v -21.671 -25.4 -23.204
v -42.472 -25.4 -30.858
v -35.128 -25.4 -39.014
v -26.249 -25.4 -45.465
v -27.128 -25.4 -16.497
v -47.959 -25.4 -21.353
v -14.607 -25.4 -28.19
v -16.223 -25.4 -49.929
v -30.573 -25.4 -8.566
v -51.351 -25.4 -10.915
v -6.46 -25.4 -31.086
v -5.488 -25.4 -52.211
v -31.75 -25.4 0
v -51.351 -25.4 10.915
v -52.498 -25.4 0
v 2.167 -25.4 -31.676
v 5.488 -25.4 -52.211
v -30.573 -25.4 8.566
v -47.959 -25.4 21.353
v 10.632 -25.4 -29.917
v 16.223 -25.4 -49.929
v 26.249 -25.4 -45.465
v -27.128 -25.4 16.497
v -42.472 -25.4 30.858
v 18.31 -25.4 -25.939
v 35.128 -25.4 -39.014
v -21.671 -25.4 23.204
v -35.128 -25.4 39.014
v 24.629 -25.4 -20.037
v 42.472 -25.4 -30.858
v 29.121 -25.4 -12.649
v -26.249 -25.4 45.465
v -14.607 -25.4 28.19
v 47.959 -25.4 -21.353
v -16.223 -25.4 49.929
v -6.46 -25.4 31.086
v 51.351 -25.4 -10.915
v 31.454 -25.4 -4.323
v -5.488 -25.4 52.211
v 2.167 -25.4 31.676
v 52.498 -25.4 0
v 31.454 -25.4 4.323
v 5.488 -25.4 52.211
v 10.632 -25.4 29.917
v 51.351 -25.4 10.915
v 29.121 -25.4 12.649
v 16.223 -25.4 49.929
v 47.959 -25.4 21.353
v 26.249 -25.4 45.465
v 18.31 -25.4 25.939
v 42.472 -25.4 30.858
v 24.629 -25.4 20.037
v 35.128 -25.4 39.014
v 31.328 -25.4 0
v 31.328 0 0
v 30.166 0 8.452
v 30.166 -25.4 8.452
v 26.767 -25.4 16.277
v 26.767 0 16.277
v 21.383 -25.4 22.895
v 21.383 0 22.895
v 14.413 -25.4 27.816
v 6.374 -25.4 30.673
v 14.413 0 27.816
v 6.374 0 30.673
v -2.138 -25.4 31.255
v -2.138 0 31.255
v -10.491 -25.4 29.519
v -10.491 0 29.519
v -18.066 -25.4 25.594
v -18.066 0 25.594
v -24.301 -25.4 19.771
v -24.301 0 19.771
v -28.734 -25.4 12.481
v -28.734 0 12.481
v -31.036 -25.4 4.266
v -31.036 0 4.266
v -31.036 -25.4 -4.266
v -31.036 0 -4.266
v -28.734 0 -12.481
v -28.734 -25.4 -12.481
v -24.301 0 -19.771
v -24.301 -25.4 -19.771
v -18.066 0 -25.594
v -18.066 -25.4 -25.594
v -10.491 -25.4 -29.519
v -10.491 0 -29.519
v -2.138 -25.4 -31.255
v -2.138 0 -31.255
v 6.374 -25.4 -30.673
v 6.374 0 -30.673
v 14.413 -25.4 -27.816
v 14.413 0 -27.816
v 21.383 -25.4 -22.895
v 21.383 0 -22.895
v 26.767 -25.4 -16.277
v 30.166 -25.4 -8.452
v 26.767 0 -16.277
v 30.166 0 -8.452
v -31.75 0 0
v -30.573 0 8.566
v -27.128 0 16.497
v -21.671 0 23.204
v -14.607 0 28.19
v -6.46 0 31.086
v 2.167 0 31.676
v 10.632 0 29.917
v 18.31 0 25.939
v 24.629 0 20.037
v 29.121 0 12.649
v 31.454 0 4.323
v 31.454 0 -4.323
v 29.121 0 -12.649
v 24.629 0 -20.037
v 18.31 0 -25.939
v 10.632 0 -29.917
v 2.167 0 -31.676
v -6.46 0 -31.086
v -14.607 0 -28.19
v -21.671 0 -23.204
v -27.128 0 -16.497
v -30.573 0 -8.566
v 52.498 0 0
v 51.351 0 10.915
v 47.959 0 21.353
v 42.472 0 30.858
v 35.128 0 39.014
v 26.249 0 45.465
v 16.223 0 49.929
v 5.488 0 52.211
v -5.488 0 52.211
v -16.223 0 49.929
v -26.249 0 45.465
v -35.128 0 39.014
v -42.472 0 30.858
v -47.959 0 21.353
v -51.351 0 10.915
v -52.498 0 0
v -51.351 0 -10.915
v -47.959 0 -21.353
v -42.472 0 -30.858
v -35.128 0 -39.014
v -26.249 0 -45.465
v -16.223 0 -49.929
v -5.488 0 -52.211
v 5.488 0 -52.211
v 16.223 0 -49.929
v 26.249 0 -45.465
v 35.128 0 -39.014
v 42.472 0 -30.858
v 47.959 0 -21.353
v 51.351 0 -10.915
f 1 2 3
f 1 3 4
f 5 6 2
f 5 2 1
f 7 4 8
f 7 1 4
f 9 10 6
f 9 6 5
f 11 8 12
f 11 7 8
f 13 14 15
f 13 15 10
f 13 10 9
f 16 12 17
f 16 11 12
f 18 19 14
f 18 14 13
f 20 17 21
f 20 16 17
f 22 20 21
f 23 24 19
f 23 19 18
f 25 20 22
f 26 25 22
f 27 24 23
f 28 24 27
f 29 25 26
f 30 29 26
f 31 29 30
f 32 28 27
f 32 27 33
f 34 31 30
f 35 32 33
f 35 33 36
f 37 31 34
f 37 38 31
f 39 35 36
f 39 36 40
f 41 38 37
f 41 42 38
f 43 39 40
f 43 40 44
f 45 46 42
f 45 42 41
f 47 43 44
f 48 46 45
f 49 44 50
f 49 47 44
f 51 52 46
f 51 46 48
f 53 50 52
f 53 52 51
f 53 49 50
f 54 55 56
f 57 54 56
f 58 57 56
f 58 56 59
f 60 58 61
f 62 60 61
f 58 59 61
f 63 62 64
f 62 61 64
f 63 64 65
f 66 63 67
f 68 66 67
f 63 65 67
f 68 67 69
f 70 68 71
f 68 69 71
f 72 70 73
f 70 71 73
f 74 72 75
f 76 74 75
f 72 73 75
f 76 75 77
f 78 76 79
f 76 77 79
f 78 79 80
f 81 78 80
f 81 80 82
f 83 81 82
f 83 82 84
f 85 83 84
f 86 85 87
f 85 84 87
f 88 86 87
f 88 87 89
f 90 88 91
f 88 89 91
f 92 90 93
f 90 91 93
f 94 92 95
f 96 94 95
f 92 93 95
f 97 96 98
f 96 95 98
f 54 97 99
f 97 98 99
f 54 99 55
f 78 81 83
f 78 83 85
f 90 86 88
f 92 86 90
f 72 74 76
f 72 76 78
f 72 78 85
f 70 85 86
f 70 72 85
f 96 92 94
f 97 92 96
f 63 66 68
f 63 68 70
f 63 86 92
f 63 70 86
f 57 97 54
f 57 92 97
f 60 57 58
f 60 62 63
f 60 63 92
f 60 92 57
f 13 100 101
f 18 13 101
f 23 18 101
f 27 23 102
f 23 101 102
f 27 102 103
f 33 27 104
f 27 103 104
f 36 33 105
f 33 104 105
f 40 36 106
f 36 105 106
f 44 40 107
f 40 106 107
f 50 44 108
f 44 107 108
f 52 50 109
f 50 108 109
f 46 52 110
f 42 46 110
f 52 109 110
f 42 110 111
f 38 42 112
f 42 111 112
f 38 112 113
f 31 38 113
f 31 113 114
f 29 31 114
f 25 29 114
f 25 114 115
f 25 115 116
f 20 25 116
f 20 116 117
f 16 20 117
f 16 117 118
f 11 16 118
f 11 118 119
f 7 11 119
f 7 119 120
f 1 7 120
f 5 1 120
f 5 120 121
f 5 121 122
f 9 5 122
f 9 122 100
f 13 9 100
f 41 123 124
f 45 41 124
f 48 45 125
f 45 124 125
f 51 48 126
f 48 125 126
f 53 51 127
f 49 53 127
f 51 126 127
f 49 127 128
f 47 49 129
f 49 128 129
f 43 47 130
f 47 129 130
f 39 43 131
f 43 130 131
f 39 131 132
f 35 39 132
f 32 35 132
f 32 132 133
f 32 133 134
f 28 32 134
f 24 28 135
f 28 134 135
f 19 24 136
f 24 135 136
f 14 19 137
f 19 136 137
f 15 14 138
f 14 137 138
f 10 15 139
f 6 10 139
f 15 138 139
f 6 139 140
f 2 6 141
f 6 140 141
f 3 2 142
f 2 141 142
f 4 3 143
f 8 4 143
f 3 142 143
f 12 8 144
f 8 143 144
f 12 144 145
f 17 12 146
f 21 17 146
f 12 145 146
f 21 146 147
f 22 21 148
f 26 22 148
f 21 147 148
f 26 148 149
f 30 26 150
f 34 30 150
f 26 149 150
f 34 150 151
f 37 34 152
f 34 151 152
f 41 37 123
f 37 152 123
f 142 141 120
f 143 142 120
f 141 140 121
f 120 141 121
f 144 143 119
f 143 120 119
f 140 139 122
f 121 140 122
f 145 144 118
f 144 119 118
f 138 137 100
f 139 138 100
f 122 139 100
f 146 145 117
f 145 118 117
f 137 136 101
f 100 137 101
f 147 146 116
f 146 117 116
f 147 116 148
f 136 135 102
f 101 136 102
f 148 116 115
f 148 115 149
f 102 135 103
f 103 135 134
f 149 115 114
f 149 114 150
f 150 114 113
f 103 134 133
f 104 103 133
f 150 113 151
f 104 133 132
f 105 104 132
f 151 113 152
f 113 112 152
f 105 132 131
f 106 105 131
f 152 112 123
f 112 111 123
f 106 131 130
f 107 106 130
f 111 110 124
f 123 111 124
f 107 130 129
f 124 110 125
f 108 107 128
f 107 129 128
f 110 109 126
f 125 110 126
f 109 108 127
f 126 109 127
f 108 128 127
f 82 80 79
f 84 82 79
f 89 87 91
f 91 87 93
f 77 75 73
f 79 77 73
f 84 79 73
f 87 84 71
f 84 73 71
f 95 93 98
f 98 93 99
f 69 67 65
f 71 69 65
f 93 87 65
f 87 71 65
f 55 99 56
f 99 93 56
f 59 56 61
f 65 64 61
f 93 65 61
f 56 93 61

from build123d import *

# Parameters (mm, degrees)
F0_R     = 52.4981574629
F1_DEPTH = 25.4
F3_D     = 63.5
F4_R     = 31.3278149766
F5_DEPTH = 25.4
F6_R     = 19.9962437195
F7_DEPTH = 25.4


with BuildPart() as f1:
    # F0 (on Front) → F1 (new body)
    with BuildSketch(Plane.XZ):
        Circle(F0_R)
    extrude(amount=F1_DEPTH)

    # F3 (through all)
    with Locations(Plane.XZ.offset(25.4)):
        with Locations((0, 0)):
            Hole(F3_D / 2)

    # F6 (on Front) → F7 (cut)
    with BuildSketch(Plane.XZ):
        Circle(F6_R)
    extrude(amount=-F7_DEPTH, mode=Mode.SUBTRACT)


with BuildPart() as f5:
    # F4 (on Front) → F5 (new body)
    with BuildSketch(Plane.XZ):
        Circle(F4_R)
    extrude(amount=F5_DEPTH)


solid = Compound([f1.part, f5.part])
